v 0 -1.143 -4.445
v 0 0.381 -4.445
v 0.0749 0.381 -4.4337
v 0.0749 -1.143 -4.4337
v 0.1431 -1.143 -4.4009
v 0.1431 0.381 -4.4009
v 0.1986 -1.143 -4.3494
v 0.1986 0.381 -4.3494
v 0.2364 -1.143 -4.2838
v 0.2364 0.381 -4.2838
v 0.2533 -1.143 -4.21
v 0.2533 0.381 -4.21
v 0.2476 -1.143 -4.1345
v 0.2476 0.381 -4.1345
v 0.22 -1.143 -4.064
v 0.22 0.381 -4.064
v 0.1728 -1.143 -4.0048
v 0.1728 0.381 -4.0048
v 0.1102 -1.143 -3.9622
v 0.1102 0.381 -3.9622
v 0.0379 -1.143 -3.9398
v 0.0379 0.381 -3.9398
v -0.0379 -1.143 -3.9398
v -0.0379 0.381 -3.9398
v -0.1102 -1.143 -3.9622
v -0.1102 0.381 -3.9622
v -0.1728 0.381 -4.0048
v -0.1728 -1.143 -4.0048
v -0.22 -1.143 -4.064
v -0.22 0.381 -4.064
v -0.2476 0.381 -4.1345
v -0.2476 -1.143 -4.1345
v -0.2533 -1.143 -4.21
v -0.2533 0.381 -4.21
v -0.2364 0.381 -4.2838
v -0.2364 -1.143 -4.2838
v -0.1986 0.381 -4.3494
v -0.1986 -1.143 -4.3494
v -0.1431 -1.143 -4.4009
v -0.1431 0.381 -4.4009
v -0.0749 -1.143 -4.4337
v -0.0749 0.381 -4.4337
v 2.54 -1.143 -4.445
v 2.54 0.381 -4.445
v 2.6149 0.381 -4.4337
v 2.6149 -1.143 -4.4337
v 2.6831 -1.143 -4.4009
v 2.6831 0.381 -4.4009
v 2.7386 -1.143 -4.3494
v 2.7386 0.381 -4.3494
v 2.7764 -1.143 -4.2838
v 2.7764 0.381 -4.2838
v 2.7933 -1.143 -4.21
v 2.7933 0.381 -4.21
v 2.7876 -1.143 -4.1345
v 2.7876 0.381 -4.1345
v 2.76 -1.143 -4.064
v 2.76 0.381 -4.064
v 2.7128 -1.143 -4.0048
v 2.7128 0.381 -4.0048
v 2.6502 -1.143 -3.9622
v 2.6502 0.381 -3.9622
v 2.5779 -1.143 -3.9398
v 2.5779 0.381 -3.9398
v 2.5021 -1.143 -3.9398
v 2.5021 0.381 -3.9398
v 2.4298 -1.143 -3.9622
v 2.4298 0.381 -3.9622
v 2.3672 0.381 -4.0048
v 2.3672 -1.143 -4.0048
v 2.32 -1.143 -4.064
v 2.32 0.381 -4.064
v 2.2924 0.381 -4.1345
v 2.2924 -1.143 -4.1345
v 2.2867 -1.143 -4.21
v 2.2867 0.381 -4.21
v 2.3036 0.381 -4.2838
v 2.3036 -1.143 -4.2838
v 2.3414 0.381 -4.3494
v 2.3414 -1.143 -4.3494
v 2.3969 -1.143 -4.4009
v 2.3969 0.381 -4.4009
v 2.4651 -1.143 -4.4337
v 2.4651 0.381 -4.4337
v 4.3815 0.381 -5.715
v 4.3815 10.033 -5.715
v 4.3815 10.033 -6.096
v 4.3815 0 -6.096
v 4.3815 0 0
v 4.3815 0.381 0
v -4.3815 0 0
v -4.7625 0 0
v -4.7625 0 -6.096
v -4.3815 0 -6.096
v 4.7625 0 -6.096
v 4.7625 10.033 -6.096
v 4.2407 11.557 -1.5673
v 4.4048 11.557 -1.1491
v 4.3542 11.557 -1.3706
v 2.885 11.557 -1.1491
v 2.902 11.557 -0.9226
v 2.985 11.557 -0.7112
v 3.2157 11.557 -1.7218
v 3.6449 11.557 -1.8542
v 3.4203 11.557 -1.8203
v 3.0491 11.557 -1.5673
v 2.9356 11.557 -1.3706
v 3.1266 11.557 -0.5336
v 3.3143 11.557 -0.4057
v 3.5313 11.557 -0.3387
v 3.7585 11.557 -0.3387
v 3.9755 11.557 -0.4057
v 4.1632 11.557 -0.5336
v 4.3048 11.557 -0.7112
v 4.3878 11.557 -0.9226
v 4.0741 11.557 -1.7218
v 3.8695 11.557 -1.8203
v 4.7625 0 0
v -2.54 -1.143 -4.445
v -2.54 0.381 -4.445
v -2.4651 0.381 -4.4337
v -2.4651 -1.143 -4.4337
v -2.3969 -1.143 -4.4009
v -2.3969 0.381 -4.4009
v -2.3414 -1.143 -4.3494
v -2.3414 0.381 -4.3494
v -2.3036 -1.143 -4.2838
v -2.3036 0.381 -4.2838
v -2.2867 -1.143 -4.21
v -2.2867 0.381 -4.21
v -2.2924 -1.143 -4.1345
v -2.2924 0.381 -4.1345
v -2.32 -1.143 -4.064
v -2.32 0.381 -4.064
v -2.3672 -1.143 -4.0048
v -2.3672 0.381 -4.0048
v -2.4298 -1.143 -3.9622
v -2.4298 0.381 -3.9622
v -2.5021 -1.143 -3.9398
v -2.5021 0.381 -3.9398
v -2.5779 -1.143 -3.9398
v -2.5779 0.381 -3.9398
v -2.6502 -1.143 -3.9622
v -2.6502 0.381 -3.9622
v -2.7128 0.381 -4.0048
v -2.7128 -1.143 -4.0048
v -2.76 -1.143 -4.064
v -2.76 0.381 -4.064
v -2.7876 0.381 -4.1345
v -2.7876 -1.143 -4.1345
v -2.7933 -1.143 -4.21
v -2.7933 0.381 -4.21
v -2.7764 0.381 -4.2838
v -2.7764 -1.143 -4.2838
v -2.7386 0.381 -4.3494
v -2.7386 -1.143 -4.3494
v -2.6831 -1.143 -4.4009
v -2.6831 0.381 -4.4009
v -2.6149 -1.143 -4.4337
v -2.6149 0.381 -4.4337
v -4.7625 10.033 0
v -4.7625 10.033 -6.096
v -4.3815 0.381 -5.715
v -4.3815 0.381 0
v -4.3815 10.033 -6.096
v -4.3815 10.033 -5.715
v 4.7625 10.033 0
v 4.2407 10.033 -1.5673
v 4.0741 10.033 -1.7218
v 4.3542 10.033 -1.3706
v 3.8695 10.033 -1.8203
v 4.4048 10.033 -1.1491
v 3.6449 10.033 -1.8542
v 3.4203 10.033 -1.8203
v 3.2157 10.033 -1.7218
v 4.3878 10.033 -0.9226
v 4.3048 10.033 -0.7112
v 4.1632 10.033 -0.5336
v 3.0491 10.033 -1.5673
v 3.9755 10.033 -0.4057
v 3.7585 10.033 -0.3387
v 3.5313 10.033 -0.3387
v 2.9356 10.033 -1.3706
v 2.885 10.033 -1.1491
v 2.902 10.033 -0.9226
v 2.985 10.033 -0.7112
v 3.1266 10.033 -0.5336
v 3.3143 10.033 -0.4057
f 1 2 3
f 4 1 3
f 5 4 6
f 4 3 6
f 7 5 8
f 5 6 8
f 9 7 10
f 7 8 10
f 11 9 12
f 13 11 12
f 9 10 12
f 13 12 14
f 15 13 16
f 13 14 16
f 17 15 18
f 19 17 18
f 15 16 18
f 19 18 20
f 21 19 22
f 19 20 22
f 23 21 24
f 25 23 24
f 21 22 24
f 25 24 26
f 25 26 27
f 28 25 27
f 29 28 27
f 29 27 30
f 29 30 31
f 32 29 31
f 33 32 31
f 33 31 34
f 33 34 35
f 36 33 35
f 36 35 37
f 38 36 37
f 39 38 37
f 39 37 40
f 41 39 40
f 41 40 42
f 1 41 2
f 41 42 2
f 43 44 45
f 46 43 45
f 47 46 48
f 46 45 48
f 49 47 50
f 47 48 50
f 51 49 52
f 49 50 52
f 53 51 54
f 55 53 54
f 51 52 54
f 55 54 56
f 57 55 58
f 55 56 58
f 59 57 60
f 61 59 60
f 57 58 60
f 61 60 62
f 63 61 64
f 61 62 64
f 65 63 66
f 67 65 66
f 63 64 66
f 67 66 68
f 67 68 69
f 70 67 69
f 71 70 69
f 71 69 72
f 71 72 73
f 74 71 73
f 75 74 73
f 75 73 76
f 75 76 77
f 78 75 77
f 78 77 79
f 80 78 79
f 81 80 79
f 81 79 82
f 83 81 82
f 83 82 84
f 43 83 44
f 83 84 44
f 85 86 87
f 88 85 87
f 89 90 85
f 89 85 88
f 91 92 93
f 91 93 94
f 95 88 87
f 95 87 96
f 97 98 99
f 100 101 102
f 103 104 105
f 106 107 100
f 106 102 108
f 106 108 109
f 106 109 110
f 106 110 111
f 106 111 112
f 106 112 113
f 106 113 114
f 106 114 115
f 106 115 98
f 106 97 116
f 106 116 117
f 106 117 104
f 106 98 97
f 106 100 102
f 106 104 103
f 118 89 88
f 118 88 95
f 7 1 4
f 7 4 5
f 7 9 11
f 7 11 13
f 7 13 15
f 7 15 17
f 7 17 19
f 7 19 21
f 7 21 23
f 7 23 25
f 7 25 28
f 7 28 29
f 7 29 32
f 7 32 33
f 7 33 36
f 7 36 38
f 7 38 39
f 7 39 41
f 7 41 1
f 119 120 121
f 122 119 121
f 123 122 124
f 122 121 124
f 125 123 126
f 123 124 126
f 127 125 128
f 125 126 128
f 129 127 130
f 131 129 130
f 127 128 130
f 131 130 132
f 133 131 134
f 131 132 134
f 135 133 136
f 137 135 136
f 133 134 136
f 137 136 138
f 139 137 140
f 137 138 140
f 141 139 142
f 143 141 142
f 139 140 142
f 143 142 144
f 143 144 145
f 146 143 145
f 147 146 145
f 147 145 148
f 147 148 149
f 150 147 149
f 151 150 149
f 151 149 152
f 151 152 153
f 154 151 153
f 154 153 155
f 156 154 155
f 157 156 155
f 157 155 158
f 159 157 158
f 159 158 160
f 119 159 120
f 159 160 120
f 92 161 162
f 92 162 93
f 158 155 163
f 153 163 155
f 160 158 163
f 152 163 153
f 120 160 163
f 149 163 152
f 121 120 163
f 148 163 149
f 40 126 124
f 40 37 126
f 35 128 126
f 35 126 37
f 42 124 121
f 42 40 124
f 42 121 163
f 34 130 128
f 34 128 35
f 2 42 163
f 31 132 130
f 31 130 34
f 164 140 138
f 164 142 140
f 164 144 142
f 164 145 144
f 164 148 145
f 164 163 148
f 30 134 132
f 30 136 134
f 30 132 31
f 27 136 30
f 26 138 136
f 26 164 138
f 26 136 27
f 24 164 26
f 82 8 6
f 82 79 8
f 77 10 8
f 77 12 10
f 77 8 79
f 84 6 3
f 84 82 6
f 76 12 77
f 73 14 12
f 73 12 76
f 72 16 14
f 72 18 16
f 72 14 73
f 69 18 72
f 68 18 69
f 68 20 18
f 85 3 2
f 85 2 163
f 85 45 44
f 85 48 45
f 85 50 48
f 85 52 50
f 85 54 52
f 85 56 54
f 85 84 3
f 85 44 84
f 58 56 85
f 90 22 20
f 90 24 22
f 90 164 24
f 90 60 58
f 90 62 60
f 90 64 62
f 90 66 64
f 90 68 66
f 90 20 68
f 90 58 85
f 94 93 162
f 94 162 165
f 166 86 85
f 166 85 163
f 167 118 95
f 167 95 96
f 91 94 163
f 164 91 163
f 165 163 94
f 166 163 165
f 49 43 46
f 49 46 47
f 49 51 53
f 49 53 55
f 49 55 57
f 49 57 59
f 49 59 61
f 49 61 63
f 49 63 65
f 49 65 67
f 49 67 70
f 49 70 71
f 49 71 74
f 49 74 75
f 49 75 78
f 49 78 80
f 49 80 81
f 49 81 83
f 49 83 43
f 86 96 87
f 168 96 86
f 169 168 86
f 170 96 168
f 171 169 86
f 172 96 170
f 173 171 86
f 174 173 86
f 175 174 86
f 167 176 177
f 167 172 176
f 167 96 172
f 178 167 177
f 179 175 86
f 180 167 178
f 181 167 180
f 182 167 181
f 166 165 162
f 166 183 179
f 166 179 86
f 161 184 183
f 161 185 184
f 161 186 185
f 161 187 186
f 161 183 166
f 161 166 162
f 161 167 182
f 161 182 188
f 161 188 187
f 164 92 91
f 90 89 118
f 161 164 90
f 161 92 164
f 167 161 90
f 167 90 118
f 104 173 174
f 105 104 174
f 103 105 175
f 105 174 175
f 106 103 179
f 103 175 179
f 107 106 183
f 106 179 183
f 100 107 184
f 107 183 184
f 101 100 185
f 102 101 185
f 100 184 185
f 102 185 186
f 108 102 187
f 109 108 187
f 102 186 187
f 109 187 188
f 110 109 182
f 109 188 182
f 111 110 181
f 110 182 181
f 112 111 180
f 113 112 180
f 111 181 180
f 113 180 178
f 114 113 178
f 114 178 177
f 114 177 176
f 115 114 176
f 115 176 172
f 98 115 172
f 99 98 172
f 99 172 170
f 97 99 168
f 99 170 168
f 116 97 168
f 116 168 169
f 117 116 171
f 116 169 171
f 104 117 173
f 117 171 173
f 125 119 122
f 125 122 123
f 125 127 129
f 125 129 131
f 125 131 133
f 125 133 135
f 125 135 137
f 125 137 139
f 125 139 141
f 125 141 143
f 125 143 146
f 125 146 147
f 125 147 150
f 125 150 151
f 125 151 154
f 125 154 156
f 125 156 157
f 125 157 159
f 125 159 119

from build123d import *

# Parameters (mm, degrees)
BASE_EXTRUDE_DEPTH = 6.096
SKETCH2_W          = 8.763
SKETCH2_H          = 0.381
CUT_EXTRUDE1_DEPTH = 13.66900593
SKETCH3_R          = 0.762
SCREW_DEPTH        = 1.524
SKETCH4_R          = 0.254
PINS_DEPTH         = 1.524


with BuildPart() as part:
    # Sketch1 → Base-Extrude (new body)
    with BuildSketch(Plane.XY):
        Polygon((4.3815, 0), (4.7625, 0), (4.7625, 10.033), (-4.7625, 10.033), (-4.7625, 0), (-4.3815, 0), (-4.3815, 0.381), (4.3815, 0.381), align=None)
    extrude(amount=-BASE_EXTRUDE_DEPTH)

    # Sketch2 → Cut-Extrude1 (cut, through all)
    with BuildSketch(Plane(origin=(0, 10.033, 0), x_dir=(-1, 0, 0), z_dir=(0, 1, 0))):
        with Locations((0, -5.9055)):
            Rectangle(SKETCH2_W, SKETCH2_H)
    extrude(amount=-CUT_EXTRUDE1_DEPTH, mode=Mode.SUBTRACT)

    # Sketch3 → screw (add)
    with BuildSketch(Plane(origin=(0, 10.033, 0), x_dir=(-1, 0, 0), z_dir=(0, 1, 0))):
        with Locations(Location((-3.6449, -1.0922, 0), (0, 0, 270))):
            Circle(SKETCH3_R)
    extrude(amount=SCREW_DEPTH)

    # Sketch4 → Pins (add)
    with BuildSketch(Plane.XZ.offset(-0.381)):
        with Locations(Location((-2.54, -4.191, 0), (0, 0, 270))):
            Circle(SKETCH4_R)
        with Locations(Location((0, -4.191, 0), (0, 0, 270))):
            Circle(SKETCH4_R)
        with Locations(Location((2.54, -4.191, 0), (0, 0, 270))):
            Circle(SKETCH4_R)
    extrude(amount=PINS_DEPTH)


solid = part.part
